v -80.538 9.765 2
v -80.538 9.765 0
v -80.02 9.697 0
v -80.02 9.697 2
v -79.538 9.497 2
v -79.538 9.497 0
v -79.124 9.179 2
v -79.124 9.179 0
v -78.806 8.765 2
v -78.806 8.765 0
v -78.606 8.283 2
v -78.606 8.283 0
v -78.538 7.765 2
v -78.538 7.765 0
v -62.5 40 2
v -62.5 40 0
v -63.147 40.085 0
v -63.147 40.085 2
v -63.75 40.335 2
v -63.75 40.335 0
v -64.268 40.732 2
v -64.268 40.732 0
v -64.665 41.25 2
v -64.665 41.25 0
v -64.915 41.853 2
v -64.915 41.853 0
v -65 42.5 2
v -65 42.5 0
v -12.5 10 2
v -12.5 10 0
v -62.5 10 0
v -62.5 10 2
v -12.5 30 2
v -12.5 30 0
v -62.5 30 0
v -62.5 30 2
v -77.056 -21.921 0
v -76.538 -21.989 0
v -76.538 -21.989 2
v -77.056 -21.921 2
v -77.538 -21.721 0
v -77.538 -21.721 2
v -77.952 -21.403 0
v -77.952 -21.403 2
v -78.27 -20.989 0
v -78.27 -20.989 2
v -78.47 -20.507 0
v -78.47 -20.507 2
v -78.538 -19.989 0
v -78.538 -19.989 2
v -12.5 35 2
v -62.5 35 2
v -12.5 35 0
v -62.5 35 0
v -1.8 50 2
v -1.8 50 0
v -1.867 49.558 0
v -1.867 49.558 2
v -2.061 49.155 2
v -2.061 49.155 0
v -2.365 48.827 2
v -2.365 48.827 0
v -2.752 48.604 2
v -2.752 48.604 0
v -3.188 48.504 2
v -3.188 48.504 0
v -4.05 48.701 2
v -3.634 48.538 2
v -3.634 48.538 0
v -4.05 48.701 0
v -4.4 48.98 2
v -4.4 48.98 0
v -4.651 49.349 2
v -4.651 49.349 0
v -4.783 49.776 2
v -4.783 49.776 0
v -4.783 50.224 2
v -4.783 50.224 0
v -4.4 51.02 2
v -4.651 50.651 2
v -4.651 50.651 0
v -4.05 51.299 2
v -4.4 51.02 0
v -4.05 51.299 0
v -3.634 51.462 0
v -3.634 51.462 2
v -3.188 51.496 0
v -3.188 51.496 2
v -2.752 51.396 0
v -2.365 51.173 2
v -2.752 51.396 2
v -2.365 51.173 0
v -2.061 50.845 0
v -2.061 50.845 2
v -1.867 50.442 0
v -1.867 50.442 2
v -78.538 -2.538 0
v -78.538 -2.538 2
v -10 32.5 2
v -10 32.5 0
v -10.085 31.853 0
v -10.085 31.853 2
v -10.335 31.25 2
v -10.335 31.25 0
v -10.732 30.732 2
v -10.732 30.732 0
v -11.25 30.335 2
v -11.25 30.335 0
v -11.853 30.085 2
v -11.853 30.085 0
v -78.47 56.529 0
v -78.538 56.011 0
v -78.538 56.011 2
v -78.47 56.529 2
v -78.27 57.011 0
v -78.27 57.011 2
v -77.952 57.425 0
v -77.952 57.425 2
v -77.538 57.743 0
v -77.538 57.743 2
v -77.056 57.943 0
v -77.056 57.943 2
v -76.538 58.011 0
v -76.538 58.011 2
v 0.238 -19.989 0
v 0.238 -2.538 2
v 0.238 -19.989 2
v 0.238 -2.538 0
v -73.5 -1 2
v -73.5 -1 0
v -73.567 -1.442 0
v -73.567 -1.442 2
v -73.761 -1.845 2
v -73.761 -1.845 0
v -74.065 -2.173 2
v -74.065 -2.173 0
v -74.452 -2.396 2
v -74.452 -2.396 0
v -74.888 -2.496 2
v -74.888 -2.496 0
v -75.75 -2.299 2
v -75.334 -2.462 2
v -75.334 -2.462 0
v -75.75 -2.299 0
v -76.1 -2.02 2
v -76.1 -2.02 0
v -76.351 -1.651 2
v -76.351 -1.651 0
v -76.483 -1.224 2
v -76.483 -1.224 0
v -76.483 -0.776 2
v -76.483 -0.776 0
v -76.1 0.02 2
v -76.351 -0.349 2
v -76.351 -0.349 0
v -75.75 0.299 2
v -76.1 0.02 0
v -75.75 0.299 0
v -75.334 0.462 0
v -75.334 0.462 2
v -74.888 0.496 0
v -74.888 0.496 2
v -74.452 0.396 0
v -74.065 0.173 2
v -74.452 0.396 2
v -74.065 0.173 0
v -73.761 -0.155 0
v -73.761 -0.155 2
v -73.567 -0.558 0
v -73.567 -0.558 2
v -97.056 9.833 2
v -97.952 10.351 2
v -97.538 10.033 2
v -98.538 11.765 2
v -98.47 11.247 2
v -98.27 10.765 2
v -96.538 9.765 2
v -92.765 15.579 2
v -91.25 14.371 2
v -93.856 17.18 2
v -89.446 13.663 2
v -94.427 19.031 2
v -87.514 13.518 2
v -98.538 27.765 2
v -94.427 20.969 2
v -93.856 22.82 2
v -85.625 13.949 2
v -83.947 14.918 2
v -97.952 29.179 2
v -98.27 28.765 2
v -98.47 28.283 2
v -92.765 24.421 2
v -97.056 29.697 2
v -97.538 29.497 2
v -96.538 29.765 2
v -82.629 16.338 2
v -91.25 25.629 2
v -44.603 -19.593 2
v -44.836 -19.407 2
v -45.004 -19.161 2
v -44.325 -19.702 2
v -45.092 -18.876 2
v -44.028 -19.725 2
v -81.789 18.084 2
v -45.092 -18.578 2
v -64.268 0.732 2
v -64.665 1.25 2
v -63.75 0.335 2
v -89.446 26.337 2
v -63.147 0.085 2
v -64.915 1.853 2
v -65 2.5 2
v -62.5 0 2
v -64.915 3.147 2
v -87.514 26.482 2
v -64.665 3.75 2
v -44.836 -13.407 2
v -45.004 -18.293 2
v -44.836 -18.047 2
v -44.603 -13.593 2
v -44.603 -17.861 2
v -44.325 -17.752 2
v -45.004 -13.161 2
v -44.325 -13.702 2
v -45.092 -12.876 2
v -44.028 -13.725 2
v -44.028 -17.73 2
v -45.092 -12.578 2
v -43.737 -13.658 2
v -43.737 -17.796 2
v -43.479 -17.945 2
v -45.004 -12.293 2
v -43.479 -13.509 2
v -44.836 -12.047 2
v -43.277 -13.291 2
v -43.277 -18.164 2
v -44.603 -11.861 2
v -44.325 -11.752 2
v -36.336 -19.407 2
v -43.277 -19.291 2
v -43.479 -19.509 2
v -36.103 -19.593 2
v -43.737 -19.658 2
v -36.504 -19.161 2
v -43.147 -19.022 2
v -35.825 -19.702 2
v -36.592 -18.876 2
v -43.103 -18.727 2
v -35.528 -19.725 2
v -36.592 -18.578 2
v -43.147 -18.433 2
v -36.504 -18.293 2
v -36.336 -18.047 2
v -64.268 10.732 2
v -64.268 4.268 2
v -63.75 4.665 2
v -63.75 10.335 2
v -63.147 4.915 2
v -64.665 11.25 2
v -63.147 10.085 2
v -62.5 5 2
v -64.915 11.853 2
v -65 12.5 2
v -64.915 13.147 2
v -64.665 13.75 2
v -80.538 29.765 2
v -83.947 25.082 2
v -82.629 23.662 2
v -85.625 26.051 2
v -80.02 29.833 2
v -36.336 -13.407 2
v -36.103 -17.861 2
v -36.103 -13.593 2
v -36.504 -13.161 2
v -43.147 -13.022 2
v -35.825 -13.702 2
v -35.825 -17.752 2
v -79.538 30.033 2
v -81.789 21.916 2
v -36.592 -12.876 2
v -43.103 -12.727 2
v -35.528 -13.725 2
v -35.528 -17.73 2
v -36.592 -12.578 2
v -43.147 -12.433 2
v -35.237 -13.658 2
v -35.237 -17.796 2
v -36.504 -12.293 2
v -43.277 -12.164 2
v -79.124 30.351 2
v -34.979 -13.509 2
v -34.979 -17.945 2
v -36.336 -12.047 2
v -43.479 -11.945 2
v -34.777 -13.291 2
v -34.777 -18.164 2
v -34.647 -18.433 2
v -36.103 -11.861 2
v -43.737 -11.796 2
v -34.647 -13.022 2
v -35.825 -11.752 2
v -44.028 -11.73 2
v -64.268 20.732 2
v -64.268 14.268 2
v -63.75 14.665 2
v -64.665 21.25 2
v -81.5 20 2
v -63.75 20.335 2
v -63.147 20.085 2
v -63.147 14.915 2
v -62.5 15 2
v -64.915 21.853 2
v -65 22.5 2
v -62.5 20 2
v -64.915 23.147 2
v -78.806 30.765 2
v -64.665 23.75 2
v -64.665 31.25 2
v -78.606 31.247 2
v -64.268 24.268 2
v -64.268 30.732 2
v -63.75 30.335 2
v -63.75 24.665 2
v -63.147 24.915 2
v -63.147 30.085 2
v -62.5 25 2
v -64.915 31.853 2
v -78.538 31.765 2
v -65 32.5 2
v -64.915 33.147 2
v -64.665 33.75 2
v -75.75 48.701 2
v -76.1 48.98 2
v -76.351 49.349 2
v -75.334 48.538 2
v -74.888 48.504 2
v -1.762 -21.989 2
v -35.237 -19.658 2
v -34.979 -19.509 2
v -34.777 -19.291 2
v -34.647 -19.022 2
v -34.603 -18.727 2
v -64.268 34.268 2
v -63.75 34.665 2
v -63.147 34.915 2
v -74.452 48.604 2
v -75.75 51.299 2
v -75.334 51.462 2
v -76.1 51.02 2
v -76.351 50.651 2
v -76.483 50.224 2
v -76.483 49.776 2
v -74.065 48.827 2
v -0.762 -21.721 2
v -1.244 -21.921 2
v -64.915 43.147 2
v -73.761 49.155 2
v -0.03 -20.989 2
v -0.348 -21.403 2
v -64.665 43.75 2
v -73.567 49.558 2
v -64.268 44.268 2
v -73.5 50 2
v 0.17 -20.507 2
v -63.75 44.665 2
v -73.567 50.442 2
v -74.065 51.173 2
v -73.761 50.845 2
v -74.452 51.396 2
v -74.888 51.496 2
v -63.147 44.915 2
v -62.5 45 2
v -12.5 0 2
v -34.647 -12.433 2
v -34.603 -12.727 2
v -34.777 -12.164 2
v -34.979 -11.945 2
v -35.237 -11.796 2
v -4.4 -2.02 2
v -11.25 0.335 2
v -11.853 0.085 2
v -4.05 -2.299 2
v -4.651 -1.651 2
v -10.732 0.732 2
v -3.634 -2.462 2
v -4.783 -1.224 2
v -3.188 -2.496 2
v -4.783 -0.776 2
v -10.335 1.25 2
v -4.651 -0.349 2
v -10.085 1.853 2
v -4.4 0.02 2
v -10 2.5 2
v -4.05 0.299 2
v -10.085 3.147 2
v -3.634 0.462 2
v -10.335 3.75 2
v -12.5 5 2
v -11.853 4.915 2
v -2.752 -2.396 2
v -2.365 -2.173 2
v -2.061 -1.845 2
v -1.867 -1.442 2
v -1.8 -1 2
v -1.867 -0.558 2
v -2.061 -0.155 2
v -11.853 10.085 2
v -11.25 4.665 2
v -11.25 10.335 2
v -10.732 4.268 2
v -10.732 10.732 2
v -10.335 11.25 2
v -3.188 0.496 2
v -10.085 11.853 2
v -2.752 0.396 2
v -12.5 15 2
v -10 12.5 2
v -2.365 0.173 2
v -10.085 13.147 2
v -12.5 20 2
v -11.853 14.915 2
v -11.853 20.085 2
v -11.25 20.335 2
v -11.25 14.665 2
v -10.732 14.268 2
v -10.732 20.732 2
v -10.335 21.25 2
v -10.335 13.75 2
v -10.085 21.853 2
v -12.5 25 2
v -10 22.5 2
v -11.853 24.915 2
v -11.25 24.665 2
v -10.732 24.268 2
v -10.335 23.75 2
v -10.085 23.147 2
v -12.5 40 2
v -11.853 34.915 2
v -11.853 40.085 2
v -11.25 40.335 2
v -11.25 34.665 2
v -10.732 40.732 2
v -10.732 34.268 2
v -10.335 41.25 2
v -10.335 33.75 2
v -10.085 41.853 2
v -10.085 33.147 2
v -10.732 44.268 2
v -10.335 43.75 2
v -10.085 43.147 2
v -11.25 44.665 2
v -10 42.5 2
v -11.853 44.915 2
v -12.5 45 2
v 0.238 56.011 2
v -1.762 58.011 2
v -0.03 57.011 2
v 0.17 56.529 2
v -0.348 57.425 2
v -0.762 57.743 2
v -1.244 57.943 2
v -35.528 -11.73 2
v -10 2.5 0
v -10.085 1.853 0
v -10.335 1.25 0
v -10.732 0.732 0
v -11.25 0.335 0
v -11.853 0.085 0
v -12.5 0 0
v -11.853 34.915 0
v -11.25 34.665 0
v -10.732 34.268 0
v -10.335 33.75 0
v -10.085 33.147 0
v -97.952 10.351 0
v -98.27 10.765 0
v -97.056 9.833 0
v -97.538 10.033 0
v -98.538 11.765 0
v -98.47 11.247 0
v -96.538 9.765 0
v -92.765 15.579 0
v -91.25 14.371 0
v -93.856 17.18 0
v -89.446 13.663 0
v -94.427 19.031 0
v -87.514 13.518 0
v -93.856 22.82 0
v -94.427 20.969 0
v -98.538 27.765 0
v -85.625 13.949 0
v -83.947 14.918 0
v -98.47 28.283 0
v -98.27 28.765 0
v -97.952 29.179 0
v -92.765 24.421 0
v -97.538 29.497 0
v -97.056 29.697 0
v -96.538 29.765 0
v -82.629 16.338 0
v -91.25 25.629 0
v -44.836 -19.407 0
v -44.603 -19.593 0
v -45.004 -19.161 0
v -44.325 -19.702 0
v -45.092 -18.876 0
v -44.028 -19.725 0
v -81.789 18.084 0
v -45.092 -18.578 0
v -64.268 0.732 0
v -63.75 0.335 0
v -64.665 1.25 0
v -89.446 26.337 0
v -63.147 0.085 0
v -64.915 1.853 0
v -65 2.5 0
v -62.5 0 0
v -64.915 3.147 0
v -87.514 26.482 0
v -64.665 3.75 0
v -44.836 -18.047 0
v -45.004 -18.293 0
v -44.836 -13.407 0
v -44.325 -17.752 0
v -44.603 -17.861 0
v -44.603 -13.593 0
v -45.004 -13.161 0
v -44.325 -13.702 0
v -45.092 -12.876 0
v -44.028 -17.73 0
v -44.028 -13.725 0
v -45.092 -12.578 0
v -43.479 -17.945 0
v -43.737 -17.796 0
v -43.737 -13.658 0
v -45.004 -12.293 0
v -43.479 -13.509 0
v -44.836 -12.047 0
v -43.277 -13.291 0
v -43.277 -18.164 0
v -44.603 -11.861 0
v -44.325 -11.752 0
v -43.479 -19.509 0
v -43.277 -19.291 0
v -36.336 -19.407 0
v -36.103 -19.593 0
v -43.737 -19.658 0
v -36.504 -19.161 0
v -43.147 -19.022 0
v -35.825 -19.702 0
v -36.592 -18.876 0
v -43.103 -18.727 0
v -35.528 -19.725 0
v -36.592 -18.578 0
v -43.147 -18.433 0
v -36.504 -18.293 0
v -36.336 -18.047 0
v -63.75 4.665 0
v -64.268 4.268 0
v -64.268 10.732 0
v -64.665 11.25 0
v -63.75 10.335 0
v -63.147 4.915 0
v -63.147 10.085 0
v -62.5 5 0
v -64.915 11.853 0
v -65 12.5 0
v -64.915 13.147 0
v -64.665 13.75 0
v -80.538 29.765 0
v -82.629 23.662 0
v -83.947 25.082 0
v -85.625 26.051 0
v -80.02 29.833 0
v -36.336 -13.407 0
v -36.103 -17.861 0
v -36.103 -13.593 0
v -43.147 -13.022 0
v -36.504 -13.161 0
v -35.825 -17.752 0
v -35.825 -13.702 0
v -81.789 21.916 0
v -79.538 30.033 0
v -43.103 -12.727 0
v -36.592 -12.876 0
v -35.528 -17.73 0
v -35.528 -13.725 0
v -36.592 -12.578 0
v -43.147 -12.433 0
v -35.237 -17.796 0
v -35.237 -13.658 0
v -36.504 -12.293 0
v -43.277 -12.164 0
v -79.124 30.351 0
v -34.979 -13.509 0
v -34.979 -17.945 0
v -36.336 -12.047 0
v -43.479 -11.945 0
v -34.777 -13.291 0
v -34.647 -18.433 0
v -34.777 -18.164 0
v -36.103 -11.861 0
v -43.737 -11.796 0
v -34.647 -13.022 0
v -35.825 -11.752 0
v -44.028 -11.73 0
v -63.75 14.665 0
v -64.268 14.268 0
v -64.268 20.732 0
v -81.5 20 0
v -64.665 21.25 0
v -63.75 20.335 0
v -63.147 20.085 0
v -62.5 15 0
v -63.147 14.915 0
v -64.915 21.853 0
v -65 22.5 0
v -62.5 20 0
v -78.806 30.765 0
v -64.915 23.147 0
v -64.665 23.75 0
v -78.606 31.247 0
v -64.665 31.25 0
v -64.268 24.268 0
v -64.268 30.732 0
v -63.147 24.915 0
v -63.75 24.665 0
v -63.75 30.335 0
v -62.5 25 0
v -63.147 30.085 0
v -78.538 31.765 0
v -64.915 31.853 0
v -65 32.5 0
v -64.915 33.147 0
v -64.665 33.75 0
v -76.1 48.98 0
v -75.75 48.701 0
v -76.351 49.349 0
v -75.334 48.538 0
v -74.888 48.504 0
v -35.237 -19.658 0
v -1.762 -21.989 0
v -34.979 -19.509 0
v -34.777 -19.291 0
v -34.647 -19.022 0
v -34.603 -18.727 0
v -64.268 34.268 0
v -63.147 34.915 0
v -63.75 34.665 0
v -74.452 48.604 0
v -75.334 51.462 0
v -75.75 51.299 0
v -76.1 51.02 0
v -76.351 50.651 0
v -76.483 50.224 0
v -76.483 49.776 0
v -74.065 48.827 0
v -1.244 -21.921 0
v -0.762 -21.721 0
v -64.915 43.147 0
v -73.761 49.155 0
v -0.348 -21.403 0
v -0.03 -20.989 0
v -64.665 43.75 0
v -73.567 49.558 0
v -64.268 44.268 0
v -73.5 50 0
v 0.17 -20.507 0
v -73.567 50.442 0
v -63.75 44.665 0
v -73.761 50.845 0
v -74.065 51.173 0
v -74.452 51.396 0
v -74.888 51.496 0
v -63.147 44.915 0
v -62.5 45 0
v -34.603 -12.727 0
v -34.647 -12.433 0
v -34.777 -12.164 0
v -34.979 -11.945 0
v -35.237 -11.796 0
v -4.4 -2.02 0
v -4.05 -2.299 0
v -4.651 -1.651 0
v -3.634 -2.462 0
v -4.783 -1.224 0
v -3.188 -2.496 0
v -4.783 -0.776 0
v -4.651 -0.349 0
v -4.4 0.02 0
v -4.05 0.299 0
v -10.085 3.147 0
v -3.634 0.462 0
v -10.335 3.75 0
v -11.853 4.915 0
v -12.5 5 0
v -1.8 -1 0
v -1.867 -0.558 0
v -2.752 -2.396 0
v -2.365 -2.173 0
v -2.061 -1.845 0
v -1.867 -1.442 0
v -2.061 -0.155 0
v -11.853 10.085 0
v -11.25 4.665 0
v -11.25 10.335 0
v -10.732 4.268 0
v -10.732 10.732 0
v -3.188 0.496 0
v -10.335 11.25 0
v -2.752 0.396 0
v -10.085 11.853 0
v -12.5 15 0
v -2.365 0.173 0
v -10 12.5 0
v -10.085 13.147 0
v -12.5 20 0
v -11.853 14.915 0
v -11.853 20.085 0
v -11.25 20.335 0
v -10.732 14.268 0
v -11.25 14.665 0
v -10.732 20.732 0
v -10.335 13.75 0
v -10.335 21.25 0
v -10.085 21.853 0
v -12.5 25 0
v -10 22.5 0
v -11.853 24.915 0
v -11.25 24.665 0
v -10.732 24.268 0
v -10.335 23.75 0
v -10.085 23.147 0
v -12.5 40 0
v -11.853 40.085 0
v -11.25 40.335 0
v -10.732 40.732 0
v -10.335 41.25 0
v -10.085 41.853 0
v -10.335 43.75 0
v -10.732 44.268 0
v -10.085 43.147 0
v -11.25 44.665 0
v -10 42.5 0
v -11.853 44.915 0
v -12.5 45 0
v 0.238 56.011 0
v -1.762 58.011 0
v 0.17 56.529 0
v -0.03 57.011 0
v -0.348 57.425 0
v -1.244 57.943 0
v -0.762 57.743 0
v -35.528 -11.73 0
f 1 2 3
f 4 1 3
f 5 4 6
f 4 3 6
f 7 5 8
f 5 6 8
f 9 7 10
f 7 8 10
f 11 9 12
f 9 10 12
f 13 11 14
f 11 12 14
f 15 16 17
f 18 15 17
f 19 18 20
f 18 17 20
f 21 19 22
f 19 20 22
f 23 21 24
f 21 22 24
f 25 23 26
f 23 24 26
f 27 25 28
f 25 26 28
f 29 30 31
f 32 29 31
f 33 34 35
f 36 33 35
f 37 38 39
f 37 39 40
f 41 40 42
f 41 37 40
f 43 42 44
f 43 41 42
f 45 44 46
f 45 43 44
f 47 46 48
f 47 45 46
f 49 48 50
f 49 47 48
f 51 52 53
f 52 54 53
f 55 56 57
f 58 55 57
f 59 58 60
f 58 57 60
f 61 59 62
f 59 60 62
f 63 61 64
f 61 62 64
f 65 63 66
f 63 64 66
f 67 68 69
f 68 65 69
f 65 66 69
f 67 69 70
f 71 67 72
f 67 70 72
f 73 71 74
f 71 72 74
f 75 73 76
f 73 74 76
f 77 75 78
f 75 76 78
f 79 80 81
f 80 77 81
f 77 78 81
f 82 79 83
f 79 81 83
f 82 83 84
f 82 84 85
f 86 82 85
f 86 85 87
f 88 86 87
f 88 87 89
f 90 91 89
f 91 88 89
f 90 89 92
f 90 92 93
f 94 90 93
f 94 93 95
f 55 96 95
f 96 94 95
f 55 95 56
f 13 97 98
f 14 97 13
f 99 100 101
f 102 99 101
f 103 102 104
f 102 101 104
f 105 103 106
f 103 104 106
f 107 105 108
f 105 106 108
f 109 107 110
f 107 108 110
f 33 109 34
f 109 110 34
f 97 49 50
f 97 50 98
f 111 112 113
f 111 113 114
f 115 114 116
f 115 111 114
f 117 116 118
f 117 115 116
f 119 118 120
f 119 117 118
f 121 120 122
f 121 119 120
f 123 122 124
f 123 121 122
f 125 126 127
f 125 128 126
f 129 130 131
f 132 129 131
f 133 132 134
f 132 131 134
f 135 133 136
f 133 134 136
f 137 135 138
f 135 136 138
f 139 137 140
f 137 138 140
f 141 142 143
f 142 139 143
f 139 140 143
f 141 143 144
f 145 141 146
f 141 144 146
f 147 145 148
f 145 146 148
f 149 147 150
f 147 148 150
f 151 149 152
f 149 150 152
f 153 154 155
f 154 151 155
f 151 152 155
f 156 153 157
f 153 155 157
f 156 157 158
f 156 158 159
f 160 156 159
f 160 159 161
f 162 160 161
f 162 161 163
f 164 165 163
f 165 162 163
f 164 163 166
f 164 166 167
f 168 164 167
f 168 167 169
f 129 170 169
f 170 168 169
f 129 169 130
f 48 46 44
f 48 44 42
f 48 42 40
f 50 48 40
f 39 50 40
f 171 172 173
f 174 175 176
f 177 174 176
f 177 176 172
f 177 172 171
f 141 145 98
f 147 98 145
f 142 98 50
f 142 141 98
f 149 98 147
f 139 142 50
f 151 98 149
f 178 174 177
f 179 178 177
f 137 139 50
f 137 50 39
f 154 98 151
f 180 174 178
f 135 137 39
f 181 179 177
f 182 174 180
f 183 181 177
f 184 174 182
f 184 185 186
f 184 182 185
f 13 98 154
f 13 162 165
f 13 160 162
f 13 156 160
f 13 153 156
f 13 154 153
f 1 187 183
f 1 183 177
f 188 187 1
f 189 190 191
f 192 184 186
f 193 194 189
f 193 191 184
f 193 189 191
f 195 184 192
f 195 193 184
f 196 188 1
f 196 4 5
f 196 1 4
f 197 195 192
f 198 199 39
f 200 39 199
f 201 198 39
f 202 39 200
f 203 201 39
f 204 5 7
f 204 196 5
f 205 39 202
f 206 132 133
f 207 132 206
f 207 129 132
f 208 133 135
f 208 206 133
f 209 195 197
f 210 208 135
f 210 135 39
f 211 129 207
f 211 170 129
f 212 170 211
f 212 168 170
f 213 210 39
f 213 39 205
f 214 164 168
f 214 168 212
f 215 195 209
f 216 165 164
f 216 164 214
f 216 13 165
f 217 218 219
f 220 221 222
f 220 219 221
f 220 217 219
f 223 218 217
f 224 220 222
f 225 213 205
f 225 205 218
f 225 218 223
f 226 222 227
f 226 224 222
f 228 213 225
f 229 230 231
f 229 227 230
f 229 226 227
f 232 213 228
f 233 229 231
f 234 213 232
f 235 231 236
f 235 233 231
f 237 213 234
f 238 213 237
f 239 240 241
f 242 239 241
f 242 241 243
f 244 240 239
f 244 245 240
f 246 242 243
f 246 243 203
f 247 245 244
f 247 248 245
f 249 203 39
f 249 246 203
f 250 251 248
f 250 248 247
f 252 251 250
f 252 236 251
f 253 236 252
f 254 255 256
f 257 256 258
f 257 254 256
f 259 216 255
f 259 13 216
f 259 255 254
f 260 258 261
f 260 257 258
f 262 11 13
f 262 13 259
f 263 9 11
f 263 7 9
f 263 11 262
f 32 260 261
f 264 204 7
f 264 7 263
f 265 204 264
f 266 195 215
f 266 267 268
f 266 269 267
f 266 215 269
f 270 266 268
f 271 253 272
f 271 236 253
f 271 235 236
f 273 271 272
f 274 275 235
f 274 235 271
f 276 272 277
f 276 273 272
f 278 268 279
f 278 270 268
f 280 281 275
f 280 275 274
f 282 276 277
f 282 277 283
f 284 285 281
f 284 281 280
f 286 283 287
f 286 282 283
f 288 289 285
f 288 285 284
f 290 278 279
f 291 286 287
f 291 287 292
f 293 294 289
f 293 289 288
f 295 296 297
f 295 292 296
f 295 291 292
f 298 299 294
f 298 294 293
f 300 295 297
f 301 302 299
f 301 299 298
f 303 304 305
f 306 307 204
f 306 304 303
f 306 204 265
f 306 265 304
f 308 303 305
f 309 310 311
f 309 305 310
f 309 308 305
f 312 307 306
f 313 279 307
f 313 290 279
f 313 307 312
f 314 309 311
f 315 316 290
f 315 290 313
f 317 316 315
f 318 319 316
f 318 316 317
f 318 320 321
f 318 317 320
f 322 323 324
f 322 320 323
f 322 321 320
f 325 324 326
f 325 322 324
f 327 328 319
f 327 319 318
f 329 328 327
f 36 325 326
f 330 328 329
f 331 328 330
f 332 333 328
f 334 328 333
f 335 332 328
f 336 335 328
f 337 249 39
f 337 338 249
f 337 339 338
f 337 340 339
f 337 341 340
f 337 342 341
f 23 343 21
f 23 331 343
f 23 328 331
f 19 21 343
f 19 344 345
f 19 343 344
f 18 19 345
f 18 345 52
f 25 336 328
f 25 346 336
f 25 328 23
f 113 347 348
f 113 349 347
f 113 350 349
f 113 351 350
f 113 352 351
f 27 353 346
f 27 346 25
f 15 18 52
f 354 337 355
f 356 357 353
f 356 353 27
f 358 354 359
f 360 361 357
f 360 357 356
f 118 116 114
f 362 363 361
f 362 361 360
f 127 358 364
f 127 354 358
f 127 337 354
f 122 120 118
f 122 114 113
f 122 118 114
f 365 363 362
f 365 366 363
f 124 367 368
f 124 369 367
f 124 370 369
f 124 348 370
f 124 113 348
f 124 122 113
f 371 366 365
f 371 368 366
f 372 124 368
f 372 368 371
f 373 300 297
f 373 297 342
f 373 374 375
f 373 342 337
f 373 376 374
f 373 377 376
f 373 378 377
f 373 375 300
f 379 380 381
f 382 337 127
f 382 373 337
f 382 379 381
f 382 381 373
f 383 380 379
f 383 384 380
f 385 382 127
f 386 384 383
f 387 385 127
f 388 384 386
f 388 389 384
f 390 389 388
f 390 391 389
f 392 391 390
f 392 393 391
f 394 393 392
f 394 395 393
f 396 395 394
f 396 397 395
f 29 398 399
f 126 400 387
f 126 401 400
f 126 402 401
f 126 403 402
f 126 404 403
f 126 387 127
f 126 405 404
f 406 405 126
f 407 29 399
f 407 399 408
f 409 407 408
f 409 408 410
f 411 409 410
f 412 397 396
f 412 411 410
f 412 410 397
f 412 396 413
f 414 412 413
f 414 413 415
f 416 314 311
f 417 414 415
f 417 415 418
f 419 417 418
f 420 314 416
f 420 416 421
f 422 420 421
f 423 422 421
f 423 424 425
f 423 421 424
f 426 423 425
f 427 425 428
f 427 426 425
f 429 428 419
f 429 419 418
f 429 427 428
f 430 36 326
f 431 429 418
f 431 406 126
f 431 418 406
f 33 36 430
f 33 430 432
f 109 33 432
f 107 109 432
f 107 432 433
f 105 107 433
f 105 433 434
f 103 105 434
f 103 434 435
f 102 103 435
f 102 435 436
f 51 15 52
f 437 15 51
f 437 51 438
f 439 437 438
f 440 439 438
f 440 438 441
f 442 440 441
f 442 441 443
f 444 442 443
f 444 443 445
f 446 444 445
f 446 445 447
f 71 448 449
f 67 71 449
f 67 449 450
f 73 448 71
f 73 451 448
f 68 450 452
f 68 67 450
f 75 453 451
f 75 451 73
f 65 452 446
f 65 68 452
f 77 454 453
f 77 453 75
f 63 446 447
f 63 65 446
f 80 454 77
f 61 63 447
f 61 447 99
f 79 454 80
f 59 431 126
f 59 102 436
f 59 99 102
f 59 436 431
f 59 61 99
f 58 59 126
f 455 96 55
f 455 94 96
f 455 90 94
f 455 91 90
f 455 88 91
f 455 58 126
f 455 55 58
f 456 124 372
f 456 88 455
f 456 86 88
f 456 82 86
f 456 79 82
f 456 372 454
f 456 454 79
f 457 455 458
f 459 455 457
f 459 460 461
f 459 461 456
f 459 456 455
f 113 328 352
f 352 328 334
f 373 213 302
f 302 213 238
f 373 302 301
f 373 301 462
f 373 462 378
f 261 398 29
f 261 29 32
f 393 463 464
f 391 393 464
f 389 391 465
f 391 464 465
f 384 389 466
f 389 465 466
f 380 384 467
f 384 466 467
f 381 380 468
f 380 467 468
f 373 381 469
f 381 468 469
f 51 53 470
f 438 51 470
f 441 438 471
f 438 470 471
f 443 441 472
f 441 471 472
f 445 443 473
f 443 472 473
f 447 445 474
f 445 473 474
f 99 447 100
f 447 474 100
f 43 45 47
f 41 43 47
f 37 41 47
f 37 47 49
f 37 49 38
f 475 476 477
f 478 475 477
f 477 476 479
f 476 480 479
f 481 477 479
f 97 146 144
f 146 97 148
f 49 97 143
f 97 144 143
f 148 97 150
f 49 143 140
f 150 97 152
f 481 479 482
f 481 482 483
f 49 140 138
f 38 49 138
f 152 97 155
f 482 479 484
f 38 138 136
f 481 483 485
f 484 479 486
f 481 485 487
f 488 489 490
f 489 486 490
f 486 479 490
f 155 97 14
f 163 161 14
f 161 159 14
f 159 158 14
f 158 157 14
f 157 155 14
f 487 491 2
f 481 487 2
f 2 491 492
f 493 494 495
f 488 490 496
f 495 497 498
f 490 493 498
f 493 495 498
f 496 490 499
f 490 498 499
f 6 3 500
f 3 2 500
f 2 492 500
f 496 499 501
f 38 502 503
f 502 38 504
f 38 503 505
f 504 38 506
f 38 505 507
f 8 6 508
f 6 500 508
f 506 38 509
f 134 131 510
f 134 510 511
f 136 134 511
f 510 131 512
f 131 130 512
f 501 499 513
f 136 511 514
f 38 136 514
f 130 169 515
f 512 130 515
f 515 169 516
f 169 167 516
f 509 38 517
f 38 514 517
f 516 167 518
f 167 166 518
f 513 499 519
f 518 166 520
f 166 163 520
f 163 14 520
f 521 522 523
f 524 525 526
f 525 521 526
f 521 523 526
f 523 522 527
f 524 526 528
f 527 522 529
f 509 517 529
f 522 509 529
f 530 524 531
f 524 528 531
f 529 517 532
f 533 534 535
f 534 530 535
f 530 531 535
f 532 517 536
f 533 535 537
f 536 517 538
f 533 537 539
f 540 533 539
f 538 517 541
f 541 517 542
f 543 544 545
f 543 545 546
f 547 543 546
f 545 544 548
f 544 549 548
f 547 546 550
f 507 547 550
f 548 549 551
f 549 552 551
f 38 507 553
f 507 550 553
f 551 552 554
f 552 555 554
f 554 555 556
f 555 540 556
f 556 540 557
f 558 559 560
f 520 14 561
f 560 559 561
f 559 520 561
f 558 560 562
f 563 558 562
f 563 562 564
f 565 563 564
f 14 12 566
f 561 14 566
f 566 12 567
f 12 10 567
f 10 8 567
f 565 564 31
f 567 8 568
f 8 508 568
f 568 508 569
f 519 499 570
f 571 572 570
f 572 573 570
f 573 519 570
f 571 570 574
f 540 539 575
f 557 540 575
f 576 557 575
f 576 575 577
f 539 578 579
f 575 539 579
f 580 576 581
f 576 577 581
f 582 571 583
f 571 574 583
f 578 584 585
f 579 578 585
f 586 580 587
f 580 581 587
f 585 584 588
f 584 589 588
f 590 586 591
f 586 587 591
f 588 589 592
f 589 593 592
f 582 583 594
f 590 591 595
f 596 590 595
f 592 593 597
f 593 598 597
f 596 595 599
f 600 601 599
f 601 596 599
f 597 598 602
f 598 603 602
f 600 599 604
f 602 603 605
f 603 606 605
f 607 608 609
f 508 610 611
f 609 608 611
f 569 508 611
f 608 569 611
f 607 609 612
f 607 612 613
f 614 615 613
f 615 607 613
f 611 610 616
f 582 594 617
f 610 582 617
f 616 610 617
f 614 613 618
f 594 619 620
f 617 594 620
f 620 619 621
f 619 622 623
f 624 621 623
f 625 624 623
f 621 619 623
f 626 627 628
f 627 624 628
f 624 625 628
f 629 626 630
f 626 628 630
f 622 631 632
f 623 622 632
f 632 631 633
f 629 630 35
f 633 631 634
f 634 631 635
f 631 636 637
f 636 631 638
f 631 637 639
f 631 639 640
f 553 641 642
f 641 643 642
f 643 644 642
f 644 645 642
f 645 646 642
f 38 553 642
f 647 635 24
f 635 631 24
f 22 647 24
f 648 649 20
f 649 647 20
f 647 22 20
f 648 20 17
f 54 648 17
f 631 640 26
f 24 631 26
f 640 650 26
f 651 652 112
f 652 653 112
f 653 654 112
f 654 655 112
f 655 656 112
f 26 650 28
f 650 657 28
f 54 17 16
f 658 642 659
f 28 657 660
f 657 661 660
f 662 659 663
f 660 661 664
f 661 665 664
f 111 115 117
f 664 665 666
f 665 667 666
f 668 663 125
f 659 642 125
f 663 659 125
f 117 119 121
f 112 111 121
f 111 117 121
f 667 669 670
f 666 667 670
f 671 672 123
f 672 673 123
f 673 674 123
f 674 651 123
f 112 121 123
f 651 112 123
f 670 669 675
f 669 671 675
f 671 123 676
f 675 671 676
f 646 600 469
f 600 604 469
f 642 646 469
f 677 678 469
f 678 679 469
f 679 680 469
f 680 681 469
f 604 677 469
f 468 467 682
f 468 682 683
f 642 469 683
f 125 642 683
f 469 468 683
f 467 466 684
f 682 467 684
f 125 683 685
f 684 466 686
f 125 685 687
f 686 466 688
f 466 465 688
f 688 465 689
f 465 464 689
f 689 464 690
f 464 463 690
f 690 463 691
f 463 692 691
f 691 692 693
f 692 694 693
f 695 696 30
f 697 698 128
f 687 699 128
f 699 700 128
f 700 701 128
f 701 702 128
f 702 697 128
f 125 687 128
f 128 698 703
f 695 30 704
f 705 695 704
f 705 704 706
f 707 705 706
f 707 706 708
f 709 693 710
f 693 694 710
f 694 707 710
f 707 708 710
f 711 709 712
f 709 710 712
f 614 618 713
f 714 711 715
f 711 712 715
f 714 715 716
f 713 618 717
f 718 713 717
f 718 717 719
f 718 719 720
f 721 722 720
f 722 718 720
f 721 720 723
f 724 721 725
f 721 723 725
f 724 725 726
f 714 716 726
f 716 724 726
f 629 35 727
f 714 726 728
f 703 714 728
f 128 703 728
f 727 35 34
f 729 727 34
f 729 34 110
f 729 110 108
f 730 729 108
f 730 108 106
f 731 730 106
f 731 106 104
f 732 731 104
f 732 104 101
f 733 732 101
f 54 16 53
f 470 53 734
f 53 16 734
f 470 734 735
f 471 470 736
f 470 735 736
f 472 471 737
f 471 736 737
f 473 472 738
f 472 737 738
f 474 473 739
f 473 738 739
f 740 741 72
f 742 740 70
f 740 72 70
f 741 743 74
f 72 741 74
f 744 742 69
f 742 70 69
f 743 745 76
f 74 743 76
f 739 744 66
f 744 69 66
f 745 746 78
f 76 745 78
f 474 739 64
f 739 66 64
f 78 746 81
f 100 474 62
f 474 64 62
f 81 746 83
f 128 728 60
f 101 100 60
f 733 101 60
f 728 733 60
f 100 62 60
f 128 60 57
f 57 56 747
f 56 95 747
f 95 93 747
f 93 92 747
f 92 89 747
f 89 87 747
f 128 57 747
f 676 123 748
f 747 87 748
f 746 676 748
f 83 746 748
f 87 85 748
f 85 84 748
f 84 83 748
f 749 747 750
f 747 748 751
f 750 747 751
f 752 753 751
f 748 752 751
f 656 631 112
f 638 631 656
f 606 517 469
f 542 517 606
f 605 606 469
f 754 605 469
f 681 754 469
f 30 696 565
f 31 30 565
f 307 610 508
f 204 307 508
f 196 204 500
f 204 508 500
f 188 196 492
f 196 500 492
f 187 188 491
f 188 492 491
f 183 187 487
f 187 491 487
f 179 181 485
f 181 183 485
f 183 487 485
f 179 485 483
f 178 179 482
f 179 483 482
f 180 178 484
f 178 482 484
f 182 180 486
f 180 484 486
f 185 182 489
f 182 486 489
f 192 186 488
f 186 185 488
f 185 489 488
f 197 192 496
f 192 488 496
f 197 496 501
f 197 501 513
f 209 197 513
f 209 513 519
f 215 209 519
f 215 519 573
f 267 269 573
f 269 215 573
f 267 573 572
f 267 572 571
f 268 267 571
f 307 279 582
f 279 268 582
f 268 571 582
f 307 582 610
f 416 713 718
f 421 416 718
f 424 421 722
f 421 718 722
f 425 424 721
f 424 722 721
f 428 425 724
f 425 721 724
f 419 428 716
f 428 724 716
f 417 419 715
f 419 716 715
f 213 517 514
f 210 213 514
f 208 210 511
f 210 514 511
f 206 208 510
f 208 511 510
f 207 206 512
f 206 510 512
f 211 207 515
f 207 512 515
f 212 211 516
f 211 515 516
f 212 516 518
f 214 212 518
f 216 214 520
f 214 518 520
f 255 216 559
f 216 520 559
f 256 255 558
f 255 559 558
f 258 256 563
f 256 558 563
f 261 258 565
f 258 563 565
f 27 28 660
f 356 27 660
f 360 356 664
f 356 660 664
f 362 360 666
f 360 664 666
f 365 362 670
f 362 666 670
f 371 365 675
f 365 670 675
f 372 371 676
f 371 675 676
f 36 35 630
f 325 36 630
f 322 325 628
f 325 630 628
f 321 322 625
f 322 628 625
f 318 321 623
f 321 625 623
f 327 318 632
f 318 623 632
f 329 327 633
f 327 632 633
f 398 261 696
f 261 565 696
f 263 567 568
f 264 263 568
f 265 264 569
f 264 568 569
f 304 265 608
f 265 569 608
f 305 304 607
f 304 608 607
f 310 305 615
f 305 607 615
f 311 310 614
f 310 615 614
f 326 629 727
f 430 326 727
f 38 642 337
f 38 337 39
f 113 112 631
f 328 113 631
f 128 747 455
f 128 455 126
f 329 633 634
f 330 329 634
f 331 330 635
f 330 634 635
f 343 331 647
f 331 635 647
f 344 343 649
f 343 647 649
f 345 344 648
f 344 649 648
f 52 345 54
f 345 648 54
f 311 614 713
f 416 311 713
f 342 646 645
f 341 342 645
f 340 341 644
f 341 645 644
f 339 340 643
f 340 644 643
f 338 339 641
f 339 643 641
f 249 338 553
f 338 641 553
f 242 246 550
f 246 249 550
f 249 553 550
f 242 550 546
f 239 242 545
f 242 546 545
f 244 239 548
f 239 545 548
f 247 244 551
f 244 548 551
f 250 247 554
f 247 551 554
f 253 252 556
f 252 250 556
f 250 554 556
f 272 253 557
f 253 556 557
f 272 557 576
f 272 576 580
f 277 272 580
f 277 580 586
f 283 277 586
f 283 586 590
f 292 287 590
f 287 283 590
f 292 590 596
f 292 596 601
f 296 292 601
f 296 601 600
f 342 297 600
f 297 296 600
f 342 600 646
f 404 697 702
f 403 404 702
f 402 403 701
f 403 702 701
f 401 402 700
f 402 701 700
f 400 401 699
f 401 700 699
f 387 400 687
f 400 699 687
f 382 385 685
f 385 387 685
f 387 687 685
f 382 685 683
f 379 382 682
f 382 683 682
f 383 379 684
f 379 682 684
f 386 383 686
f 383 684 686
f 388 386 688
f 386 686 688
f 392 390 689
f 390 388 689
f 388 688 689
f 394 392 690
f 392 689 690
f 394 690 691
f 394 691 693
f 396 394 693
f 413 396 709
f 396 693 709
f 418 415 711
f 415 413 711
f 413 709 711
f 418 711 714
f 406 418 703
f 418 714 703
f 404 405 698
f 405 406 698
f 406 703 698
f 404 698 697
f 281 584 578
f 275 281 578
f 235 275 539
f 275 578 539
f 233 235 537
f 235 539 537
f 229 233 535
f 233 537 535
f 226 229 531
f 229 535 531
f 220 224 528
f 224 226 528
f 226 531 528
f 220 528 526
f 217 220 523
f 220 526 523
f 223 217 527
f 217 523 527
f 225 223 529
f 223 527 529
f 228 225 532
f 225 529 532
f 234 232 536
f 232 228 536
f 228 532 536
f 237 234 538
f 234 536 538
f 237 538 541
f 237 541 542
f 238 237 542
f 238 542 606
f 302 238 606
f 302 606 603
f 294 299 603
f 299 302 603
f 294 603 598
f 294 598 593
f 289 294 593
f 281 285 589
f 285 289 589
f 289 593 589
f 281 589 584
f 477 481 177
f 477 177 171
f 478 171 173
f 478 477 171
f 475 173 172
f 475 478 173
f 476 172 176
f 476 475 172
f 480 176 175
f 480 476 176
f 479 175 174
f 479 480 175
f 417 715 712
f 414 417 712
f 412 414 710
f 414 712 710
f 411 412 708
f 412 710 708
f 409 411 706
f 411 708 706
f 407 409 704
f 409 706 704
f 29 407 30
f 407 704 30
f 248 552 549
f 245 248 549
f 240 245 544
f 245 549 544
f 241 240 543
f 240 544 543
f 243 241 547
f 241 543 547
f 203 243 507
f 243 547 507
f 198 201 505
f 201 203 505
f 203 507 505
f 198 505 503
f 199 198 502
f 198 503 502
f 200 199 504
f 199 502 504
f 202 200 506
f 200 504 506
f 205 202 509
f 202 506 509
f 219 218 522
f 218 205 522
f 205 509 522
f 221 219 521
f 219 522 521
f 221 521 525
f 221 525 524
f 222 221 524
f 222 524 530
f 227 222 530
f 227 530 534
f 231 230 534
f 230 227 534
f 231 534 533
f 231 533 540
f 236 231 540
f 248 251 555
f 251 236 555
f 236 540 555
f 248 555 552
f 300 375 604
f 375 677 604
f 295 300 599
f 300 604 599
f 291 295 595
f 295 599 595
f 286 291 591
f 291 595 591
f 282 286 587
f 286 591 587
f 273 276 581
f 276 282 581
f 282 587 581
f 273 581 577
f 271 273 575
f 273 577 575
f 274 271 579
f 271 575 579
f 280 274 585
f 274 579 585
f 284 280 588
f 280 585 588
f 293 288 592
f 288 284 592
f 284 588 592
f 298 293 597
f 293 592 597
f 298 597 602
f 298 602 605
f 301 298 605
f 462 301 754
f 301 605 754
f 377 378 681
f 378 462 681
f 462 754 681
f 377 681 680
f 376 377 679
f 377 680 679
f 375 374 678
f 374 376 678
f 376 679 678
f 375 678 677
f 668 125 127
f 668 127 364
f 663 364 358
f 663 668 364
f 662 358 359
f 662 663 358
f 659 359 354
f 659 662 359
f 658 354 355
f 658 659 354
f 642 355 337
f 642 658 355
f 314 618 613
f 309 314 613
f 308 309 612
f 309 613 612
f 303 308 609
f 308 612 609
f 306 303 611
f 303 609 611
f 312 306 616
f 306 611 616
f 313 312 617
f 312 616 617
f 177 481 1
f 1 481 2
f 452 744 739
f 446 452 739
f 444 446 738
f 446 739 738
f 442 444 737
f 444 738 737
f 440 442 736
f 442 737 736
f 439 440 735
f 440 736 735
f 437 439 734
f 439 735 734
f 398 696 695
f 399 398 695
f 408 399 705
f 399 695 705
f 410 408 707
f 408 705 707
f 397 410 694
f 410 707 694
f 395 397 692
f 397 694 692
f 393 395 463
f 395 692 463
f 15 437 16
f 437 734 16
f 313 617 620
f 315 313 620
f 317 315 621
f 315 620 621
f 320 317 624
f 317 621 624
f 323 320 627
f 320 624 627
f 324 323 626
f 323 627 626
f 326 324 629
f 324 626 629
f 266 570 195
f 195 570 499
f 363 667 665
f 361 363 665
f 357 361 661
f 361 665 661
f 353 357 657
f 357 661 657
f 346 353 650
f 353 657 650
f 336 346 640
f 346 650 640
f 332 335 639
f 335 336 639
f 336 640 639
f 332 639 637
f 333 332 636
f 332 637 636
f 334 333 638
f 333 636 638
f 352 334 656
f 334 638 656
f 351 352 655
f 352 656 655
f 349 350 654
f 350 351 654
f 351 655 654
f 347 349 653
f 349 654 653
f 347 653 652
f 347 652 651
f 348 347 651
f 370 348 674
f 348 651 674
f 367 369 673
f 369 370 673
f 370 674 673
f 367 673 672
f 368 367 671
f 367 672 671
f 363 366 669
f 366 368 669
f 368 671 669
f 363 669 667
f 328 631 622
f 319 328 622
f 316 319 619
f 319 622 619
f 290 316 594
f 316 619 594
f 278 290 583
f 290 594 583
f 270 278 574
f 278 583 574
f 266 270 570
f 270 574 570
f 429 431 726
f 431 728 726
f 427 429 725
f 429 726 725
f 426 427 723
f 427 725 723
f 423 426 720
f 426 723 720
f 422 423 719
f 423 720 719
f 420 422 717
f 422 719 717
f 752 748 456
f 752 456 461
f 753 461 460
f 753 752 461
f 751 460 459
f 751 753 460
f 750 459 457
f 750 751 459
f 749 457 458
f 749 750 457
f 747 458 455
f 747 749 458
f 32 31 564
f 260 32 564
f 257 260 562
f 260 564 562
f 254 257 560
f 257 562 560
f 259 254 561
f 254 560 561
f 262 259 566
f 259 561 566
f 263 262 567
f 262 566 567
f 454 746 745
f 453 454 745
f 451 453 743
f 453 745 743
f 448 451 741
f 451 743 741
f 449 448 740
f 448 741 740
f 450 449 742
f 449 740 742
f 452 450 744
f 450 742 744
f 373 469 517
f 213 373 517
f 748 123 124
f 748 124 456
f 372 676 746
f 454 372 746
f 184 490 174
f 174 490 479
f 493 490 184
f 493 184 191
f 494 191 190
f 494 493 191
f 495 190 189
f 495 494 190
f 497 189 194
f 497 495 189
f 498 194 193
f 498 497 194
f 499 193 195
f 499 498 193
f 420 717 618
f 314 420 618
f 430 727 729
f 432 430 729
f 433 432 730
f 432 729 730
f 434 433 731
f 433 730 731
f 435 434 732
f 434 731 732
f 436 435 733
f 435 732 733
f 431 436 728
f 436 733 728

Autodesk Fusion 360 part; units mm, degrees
sketch "Sketch1" plane through (0, 0, 0) normal (0, 0, 1) x (1, 0, 0)
  line L0 (-78.5381, -2.5381) -> (-78.5381, 7.765)
  line L1 (-76.5381, 58.0111) -> (-1.7619, 58.0111)
  line L2 (0.2381, 56.0111) -> (0.2381, -2.5381)
  circle A0 centre (-3.3, -1) radius 1.5
  circle A1 centre (-3.3, 50) radius 1.5
  circle A2 centre (-75, 50) radius 1.5
  circle A3 centre (-75, -1) radius 1.5
  line L3 (-62.5, 45) -> (-12.5, 45)
  line L4 (-12.5, 40) -> (-62.5, 40)
  line L5 (-62.5, 35) -> (-12.5, 35)
  line L6 (-12.5, 30) -> (-62.5, 30)
  line L7 (-62.5, 25) -> (-12.5, 25)
  line L8 (-12.5, 20) -> (-62.5, 20)
  line L9 (-62.5, 15) -> (-12.5, 15)
  line L10 (-12.5, 10) -> (-62.5, 10)
  line L11 (-62.5, 5) -> (-12.5, 5)
  line L12 (-12.5, 0) -> (-62.5, 0)
  arc A4 (-62.5, 45) -> (-65, 42.5) centre (-62.5, 42.5) ccw
  arc A5 (-65, 42.5) -> (-62.5, 40) centre (-62.5, 42.5) ccw
  arc A6 (-10, 42.5) -> (-12.5, 45) centre (-12.5, 42.5) ccw
  arc A7 (-12.5, 40) -> (-10, 42.5) centre (-12.5, 42.5) ccw
  arc A8 (-62.5, 35) -> (-65, 32.5) centre (-62.5, 32.5) ccw
  arc A9 (-65, 32.5) -> (-62.5, 30) centre (-62.5, 32.5) ccw
  arc A10 (-10, 32.5) -> (-12.5, 35) centre (-12.5, 32.5) ccw
  arc A11 (-12.5, 30) -> (-10, 32.5) centre (-12.5, 32.5) ccw
  arc A12 (-10, 22.5) -> (-12.5, 25) centre (-12.5, 22.5) ccw
  arc A13 (-12.5, 20) -> (-10, 22.5) centre (-12.5, 22.5) ccw
  arc A14 (-62.5, 25) -> (-65, 22.5) centre (-62.5, 22.5) ccw
  arc A15 (-65, 22.5) -> (-62.5, 20) centre (-62.5, 22.5) ccw
  arc A16 (-62.5, 15) -> (-65, 12.5) centre (-62.5, 12.5) ccw
  arc A17 (-65, 12.5) -> (-62.5, 10) centre (-62.5, 12.5) ccw
  arc A18 (-10, 12.5) -> (-12.5, 15) centre (-12.5, 12.5) ccw
  arc A19 (-12.5, 10) -> (-10, 12.5) centre (-12.5, 12.5) ccw
  arc A20 (-10, 2.5) -> (-12.5, 5) centre (-12.5, 2.5) ccw
  arc A21 (-12.5, 0) -> (-10, 2.5) centre (-12.5, 2.5) ccw
  arc A22 (-62.5, 5) -> (-65, 2.5) centre (-62.5, 2.5) ccw
  arc A23 (-65, 2.5) -> (-62.5, 0) centre (-62.5, 2.5) ccw
  line L13 (-80.5381, 29.765) -> (-96.5381, 29.765)
  line L14 (-98.5381, 27.765) -> (-98.5381, 11.765)
  line L15 (-96.5381, 9.765) -> (-80.5381, 9.765)
  circle A24 centre (-88, 20) radius 6.5
  arc A25 (-76.5381, 58.0111) -> (-78.5381, 56.0111) centre (-76.5381, 56.0111) ccw
  arc A26 (0.2381, 56.0111) -> (-1.7619, 58.0111) centre (-1.7619, 56.0111) ccw
  arc A27 (-78.5381, 7.765) -> (-80.5381, 9.765) centre (-80.5381, 7.765) ccw
  arc A28 (-96.5381, 29.765) -> (-98.5381, 27.765) centre (-96.5381, 27.765) ccw
  arc A29 (-98.5381, 11.765) -> (-96.5381, 9.765) centre (-96.5381, 11.765) ccw
  line L16 (-78.5381, 56.0111) -> (-78.5381, 31.765)
  arc A30 (-80.5381, 29.765) -> (-78.5381, 31.765) centre (-80.5381, 31.765) ccw
  line L17 (0.2381, -2.5381) -> (0.2381, -19.9889)
  line L18 (-1.7619, -21.9889) -> (-76.5381, -21.9889)
  line L19 (-78.5381, -19.9889) -> (-78.5381, -2.5381)
  arc A31 (-78.5381, -19.9889) -> (-76.5381, -21.9889) centre (-76.5381, -19.9889) ccw
  arc A32 (-1.7619, -21.9889) -> (0.2381, -19.9889) centre (-1.7619, -19.9889) ccw
  circle A33 centre (-44.1028, -12.7273) radius 1
  circle A34 centre (-35.6028, -12.7273) radius 1
  circle A35 centre (-35.6028, -18.7273) radius 1
  circle A36 centre (-44.1028, -18.7273) radius 1
  point P0 (-98.5381, 29.765)
  dimension "d1" = 71.7
  dimension "d2" = 51
  dimension "d4" = 3
  dimension "d5" = 3
  dimension "d6" = 3
  dimension "d7" = 3
  dimension "d8" = 2.5
  dimension "d9" = 2.5
  dimension "d18" = 13
  dimension "d21" = 2
  dimension "d22" = 2
  dimension "d25" = 2
  dimension "d28" = 80
  dimension "d37" = 8.5
  dimension "d38" = 6
  dimension "d39" = 2
  dimension "d40" = 2
  dimension "d41" = 2
  dimension "d42" = 2
extrude "Extrude4" add sketch "Sketch1" along normal blind 2
